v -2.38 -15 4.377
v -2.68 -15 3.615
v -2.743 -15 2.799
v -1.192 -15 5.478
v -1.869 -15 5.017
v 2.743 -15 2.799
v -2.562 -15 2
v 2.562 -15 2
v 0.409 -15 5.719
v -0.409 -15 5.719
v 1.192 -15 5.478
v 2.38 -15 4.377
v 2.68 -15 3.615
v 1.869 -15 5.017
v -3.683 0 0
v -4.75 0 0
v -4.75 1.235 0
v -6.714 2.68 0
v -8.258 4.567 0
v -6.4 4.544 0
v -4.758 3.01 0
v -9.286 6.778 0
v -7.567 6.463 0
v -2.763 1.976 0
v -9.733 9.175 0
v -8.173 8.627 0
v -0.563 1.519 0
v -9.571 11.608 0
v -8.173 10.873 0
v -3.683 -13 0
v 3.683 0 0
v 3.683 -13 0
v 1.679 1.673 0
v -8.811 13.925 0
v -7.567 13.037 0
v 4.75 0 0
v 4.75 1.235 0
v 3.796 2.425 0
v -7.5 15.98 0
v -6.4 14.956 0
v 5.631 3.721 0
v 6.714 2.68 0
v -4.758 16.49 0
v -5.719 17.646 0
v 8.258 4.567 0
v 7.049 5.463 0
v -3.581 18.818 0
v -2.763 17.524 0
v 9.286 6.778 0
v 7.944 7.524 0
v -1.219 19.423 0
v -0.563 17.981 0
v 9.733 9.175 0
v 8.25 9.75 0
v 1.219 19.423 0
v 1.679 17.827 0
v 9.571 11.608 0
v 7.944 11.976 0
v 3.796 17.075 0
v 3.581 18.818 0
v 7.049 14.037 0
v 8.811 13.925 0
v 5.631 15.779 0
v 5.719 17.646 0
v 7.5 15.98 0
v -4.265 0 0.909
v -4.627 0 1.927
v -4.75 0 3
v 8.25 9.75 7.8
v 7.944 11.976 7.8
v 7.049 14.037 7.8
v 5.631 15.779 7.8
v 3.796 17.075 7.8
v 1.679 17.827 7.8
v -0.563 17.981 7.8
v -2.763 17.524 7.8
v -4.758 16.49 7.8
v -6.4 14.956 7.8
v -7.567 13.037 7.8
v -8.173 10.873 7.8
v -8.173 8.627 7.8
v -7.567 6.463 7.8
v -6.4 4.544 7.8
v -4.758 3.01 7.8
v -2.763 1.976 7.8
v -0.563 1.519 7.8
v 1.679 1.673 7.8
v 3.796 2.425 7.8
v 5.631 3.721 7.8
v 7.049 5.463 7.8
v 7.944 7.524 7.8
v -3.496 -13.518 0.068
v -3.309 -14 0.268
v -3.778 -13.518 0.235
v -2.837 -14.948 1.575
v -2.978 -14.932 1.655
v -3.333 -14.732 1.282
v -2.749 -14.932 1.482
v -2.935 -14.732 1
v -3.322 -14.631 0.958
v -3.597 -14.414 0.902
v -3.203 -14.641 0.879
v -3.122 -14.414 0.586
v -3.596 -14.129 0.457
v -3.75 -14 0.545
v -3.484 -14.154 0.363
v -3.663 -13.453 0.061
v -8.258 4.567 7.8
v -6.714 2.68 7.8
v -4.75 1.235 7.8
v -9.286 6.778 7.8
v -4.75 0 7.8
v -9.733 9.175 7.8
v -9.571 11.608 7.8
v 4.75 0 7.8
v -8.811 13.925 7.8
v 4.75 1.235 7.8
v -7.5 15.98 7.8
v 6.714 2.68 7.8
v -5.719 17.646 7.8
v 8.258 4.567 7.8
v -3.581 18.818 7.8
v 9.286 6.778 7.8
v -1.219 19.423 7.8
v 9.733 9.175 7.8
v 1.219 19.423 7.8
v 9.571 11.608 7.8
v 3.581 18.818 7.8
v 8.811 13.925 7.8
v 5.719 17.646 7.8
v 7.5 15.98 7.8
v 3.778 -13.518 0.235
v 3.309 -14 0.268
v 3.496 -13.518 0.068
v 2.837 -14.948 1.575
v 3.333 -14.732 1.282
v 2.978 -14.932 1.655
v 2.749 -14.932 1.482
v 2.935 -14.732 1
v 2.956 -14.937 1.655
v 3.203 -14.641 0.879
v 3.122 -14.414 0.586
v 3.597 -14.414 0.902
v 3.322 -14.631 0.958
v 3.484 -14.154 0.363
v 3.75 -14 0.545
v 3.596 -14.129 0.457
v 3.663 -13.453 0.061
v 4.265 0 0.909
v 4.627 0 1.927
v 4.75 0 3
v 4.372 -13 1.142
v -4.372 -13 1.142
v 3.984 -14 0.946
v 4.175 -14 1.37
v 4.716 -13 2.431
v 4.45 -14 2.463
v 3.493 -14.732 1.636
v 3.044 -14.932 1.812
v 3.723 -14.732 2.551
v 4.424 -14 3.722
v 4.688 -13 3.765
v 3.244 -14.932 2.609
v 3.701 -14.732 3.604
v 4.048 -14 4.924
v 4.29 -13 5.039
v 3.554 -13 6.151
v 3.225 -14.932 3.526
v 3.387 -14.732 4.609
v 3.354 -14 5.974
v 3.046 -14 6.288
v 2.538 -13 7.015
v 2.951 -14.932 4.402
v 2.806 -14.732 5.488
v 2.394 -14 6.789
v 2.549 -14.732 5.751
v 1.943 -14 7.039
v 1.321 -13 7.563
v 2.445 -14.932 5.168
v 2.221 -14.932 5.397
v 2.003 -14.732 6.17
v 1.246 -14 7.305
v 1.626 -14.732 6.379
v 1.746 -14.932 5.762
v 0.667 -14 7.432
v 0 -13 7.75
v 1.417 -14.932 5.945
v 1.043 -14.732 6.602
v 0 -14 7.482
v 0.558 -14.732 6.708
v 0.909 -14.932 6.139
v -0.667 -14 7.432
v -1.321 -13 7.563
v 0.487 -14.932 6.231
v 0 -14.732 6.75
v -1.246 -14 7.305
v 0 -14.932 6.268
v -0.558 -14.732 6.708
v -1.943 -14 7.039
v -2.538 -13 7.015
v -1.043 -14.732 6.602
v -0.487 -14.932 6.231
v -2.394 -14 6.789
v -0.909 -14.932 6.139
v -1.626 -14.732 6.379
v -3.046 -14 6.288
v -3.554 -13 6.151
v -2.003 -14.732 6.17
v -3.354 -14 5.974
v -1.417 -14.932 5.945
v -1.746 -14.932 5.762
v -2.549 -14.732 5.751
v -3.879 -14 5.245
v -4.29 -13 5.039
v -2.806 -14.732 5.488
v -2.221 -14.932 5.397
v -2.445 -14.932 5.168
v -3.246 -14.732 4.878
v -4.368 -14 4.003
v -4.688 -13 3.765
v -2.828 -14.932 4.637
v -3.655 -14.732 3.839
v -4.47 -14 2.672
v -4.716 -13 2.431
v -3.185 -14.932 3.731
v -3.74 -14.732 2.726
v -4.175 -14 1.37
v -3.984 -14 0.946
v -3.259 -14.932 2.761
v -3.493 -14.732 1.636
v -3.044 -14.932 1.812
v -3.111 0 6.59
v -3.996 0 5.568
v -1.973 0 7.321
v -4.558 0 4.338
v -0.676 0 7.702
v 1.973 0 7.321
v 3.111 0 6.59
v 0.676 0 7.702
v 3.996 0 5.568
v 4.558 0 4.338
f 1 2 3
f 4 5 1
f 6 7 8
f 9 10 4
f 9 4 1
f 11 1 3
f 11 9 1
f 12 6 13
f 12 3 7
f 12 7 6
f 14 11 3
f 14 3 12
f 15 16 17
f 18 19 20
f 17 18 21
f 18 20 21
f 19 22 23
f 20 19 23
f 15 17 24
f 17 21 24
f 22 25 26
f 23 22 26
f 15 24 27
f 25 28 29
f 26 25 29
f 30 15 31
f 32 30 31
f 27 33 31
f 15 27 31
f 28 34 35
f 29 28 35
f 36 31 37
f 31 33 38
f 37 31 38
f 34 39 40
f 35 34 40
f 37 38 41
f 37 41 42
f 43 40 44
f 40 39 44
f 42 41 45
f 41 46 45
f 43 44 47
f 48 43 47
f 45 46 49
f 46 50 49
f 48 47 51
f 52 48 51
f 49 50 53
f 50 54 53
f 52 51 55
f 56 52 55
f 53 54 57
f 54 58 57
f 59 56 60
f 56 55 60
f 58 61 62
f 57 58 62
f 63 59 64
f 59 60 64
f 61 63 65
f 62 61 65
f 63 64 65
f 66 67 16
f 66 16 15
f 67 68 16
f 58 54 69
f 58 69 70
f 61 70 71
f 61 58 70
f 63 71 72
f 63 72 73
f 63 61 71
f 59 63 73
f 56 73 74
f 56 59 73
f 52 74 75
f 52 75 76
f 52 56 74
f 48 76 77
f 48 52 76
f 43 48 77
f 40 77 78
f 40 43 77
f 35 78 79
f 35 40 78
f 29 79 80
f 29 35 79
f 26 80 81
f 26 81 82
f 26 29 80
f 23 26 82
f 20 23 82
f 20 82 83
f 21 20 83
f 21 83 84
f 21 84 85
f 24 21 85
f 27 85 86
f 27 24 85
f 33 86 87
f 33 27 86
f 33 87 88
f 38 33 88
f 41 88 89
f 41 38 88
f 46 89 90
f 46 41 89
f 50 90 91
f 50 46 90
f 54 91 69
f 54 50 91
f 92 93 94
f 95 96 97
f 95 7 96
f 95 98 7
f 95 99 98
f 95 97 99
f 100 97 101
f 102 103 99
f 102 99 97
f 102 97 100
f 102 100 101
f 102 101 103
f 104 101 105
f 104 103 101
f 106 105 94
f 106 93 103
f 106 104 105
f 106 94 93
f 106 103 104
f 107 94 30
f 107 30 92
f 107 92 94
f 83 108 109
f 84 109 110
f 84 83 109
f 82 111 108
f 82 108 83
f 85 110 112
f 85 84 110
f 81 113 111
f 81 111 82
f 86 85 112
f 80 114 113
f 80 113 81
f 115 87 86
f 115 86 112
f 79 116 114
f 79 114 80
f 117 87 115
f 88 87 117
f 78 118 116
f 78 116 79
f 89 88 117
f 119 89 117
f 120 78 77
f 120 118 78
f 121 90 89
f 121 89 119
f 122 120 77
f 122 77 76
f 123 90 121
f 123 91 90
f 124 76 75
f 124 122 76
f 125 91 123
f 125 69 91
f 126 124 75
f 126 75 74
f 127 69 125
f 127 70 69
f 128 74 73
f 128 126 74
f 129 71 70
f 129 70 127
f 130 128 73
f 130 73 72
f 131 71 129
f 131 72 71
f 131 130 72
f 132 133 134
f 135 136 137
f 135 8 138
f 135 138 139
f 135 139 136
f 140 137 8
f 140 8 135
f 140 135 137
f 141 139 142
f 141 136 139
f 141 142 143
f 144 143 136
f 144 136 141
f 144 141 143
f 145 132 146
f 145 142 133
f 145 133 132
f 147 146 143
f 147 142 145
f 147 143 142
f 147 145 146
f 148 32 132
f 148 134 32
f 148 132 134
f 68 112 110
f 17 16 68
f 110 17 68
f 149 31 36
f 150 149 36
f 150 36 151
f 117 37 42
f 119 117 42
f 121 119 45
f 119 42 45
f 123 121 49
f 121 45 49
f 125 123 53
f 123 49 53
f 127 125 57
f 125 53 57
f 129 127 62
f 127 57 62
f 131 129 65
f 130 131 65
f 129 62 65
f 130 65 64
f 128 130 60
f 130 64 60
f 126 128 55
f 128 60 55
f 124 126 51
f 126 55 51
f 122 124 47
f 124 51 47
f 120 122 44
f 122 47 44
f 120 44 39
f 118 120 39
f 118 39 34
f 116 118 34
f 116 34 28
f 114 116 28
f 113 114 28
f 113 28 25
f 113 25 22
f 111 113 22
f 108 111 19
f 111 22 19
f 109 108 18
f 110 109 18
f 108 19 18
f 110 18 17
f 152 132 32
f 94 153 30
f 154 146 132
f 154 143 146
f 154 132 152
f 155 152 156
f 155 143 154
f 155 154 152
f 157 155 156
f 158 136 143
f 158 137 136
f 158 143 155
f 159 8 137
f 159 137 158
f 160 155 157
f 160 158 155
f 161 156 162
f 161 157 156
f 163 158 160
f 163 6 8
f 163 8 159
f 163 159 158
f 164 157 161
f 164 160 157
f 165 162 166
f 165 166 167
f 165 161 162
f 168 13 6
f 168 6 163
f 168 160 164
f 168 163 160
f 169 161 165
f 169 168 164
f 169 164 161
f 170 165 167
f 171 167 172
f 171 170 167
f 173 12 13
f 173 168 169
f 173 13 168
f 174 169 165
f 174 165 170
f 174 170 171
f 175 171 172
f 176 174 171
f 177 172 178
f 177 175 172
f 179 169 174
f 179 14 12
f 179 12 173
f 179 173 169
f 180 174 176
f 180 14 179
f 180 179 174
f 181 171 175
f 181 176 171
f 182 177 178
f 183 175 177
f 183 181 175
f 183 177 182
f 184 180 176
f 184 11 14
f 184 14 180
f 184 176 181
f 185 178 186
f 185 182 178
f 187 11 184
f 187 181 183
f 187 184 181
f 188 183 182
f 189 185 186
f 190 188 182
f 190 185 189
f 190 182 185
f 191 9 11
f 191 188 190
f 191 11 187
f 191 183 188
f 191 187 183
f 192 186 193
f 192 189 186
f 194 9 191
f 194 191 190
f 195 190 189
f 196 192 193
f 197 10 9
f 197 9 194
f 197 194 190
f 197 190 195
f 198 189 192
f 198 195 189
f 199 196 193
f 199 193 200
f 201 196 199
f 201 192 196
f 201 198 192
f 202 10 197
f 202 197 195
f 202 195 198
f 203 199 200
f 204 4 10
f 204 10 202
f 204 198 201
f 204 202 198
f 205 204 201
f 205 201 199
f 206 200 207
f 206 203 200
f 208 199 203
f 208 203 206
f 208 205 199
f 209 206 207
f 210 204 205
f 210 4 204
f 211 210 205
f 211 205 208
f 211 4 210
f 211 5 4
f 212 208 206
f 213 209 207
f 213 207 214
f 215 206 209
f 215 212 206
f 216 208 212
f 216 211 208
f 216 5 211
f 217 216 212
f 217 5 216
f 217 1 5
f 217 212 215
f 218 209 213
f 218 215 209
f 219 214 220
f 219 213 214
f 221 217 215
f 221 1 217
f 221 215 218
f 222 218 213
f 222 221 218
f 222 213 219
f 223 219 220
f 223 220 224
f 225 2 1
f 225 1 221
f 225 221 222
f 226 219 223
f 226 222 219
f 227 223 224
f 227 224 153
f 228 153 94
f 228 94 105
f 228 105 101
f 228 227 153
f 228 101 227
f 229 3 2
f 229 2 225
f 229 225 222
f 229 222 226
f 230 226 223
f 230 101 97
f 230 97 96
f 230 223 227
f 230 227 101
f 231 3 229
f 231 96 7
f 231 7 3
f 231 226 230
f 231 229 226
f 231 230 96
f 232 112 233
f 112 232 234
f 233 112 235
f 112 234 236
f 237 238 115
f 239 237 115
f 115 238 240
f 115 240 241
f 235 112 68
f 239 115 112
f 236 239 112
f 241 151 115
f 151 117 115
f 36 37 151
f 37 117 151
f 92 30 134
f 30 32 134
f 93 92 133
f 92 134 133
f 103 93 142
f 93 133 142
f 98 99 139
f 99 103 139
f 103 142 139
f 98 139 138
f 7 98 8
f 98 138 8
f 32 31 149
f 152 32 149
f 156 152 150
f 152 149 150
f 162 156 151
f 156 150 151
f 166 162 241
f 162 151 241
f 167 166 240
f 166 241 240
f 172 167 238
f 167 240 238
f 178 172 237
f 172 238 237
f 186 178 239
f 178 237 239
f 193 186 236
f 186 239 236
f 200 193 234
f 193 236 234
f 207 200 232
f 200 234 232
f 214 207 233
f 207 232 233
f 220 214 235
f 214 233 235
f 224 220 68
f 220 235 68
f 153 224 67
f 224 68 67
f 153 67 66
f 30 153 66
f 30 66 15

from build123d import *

# Parameters (mm, degrees)
PAD_DEPTH     = 15
SKETCH001_R   = 9.75
SKETCH001_R_2 = 8.25
PAD001_DEPTH  = 7.8
FILLET_R      = 2


with BuildPart() as part:
    # Sketch → Pad (new body)
    with BuildSketch(Plane.XZ):
        with BuildLine():
            ThreePointArc((3.68273, 0), (0, 7.75), (-3.68273, 0))
            Line((-3.68273, 0), (3.68273, 0))
        make_face()
    extrude(amount=PAD_DEPTH)

    # Sketch001 → Pad001 (join)
    with BuildSketch(Plane.XY):
        with Locations((0, 9.75)):
            Circle(SKETCH001_R)
        with Locations((0, 9.75)):
            Circle(SKETCH001_R_2, mode=Mode.SUBTRACT)
        Polygon((-4.75, 0), (-4.75, 1.235307), (0, 0), (4.75, 1.235307), (4.75, 0), align=None)
    extrude(amount=PAD001_DEPTH)

    # Fillet
    fillet_edges = [part.edges().sort_by_distance(p)[0] for p in [
        (0, -15, 7.75),
        (0, -15, 0),
    ]]
    fillet(fillet_edges, radius=FILLET_R)


solid = part.part
